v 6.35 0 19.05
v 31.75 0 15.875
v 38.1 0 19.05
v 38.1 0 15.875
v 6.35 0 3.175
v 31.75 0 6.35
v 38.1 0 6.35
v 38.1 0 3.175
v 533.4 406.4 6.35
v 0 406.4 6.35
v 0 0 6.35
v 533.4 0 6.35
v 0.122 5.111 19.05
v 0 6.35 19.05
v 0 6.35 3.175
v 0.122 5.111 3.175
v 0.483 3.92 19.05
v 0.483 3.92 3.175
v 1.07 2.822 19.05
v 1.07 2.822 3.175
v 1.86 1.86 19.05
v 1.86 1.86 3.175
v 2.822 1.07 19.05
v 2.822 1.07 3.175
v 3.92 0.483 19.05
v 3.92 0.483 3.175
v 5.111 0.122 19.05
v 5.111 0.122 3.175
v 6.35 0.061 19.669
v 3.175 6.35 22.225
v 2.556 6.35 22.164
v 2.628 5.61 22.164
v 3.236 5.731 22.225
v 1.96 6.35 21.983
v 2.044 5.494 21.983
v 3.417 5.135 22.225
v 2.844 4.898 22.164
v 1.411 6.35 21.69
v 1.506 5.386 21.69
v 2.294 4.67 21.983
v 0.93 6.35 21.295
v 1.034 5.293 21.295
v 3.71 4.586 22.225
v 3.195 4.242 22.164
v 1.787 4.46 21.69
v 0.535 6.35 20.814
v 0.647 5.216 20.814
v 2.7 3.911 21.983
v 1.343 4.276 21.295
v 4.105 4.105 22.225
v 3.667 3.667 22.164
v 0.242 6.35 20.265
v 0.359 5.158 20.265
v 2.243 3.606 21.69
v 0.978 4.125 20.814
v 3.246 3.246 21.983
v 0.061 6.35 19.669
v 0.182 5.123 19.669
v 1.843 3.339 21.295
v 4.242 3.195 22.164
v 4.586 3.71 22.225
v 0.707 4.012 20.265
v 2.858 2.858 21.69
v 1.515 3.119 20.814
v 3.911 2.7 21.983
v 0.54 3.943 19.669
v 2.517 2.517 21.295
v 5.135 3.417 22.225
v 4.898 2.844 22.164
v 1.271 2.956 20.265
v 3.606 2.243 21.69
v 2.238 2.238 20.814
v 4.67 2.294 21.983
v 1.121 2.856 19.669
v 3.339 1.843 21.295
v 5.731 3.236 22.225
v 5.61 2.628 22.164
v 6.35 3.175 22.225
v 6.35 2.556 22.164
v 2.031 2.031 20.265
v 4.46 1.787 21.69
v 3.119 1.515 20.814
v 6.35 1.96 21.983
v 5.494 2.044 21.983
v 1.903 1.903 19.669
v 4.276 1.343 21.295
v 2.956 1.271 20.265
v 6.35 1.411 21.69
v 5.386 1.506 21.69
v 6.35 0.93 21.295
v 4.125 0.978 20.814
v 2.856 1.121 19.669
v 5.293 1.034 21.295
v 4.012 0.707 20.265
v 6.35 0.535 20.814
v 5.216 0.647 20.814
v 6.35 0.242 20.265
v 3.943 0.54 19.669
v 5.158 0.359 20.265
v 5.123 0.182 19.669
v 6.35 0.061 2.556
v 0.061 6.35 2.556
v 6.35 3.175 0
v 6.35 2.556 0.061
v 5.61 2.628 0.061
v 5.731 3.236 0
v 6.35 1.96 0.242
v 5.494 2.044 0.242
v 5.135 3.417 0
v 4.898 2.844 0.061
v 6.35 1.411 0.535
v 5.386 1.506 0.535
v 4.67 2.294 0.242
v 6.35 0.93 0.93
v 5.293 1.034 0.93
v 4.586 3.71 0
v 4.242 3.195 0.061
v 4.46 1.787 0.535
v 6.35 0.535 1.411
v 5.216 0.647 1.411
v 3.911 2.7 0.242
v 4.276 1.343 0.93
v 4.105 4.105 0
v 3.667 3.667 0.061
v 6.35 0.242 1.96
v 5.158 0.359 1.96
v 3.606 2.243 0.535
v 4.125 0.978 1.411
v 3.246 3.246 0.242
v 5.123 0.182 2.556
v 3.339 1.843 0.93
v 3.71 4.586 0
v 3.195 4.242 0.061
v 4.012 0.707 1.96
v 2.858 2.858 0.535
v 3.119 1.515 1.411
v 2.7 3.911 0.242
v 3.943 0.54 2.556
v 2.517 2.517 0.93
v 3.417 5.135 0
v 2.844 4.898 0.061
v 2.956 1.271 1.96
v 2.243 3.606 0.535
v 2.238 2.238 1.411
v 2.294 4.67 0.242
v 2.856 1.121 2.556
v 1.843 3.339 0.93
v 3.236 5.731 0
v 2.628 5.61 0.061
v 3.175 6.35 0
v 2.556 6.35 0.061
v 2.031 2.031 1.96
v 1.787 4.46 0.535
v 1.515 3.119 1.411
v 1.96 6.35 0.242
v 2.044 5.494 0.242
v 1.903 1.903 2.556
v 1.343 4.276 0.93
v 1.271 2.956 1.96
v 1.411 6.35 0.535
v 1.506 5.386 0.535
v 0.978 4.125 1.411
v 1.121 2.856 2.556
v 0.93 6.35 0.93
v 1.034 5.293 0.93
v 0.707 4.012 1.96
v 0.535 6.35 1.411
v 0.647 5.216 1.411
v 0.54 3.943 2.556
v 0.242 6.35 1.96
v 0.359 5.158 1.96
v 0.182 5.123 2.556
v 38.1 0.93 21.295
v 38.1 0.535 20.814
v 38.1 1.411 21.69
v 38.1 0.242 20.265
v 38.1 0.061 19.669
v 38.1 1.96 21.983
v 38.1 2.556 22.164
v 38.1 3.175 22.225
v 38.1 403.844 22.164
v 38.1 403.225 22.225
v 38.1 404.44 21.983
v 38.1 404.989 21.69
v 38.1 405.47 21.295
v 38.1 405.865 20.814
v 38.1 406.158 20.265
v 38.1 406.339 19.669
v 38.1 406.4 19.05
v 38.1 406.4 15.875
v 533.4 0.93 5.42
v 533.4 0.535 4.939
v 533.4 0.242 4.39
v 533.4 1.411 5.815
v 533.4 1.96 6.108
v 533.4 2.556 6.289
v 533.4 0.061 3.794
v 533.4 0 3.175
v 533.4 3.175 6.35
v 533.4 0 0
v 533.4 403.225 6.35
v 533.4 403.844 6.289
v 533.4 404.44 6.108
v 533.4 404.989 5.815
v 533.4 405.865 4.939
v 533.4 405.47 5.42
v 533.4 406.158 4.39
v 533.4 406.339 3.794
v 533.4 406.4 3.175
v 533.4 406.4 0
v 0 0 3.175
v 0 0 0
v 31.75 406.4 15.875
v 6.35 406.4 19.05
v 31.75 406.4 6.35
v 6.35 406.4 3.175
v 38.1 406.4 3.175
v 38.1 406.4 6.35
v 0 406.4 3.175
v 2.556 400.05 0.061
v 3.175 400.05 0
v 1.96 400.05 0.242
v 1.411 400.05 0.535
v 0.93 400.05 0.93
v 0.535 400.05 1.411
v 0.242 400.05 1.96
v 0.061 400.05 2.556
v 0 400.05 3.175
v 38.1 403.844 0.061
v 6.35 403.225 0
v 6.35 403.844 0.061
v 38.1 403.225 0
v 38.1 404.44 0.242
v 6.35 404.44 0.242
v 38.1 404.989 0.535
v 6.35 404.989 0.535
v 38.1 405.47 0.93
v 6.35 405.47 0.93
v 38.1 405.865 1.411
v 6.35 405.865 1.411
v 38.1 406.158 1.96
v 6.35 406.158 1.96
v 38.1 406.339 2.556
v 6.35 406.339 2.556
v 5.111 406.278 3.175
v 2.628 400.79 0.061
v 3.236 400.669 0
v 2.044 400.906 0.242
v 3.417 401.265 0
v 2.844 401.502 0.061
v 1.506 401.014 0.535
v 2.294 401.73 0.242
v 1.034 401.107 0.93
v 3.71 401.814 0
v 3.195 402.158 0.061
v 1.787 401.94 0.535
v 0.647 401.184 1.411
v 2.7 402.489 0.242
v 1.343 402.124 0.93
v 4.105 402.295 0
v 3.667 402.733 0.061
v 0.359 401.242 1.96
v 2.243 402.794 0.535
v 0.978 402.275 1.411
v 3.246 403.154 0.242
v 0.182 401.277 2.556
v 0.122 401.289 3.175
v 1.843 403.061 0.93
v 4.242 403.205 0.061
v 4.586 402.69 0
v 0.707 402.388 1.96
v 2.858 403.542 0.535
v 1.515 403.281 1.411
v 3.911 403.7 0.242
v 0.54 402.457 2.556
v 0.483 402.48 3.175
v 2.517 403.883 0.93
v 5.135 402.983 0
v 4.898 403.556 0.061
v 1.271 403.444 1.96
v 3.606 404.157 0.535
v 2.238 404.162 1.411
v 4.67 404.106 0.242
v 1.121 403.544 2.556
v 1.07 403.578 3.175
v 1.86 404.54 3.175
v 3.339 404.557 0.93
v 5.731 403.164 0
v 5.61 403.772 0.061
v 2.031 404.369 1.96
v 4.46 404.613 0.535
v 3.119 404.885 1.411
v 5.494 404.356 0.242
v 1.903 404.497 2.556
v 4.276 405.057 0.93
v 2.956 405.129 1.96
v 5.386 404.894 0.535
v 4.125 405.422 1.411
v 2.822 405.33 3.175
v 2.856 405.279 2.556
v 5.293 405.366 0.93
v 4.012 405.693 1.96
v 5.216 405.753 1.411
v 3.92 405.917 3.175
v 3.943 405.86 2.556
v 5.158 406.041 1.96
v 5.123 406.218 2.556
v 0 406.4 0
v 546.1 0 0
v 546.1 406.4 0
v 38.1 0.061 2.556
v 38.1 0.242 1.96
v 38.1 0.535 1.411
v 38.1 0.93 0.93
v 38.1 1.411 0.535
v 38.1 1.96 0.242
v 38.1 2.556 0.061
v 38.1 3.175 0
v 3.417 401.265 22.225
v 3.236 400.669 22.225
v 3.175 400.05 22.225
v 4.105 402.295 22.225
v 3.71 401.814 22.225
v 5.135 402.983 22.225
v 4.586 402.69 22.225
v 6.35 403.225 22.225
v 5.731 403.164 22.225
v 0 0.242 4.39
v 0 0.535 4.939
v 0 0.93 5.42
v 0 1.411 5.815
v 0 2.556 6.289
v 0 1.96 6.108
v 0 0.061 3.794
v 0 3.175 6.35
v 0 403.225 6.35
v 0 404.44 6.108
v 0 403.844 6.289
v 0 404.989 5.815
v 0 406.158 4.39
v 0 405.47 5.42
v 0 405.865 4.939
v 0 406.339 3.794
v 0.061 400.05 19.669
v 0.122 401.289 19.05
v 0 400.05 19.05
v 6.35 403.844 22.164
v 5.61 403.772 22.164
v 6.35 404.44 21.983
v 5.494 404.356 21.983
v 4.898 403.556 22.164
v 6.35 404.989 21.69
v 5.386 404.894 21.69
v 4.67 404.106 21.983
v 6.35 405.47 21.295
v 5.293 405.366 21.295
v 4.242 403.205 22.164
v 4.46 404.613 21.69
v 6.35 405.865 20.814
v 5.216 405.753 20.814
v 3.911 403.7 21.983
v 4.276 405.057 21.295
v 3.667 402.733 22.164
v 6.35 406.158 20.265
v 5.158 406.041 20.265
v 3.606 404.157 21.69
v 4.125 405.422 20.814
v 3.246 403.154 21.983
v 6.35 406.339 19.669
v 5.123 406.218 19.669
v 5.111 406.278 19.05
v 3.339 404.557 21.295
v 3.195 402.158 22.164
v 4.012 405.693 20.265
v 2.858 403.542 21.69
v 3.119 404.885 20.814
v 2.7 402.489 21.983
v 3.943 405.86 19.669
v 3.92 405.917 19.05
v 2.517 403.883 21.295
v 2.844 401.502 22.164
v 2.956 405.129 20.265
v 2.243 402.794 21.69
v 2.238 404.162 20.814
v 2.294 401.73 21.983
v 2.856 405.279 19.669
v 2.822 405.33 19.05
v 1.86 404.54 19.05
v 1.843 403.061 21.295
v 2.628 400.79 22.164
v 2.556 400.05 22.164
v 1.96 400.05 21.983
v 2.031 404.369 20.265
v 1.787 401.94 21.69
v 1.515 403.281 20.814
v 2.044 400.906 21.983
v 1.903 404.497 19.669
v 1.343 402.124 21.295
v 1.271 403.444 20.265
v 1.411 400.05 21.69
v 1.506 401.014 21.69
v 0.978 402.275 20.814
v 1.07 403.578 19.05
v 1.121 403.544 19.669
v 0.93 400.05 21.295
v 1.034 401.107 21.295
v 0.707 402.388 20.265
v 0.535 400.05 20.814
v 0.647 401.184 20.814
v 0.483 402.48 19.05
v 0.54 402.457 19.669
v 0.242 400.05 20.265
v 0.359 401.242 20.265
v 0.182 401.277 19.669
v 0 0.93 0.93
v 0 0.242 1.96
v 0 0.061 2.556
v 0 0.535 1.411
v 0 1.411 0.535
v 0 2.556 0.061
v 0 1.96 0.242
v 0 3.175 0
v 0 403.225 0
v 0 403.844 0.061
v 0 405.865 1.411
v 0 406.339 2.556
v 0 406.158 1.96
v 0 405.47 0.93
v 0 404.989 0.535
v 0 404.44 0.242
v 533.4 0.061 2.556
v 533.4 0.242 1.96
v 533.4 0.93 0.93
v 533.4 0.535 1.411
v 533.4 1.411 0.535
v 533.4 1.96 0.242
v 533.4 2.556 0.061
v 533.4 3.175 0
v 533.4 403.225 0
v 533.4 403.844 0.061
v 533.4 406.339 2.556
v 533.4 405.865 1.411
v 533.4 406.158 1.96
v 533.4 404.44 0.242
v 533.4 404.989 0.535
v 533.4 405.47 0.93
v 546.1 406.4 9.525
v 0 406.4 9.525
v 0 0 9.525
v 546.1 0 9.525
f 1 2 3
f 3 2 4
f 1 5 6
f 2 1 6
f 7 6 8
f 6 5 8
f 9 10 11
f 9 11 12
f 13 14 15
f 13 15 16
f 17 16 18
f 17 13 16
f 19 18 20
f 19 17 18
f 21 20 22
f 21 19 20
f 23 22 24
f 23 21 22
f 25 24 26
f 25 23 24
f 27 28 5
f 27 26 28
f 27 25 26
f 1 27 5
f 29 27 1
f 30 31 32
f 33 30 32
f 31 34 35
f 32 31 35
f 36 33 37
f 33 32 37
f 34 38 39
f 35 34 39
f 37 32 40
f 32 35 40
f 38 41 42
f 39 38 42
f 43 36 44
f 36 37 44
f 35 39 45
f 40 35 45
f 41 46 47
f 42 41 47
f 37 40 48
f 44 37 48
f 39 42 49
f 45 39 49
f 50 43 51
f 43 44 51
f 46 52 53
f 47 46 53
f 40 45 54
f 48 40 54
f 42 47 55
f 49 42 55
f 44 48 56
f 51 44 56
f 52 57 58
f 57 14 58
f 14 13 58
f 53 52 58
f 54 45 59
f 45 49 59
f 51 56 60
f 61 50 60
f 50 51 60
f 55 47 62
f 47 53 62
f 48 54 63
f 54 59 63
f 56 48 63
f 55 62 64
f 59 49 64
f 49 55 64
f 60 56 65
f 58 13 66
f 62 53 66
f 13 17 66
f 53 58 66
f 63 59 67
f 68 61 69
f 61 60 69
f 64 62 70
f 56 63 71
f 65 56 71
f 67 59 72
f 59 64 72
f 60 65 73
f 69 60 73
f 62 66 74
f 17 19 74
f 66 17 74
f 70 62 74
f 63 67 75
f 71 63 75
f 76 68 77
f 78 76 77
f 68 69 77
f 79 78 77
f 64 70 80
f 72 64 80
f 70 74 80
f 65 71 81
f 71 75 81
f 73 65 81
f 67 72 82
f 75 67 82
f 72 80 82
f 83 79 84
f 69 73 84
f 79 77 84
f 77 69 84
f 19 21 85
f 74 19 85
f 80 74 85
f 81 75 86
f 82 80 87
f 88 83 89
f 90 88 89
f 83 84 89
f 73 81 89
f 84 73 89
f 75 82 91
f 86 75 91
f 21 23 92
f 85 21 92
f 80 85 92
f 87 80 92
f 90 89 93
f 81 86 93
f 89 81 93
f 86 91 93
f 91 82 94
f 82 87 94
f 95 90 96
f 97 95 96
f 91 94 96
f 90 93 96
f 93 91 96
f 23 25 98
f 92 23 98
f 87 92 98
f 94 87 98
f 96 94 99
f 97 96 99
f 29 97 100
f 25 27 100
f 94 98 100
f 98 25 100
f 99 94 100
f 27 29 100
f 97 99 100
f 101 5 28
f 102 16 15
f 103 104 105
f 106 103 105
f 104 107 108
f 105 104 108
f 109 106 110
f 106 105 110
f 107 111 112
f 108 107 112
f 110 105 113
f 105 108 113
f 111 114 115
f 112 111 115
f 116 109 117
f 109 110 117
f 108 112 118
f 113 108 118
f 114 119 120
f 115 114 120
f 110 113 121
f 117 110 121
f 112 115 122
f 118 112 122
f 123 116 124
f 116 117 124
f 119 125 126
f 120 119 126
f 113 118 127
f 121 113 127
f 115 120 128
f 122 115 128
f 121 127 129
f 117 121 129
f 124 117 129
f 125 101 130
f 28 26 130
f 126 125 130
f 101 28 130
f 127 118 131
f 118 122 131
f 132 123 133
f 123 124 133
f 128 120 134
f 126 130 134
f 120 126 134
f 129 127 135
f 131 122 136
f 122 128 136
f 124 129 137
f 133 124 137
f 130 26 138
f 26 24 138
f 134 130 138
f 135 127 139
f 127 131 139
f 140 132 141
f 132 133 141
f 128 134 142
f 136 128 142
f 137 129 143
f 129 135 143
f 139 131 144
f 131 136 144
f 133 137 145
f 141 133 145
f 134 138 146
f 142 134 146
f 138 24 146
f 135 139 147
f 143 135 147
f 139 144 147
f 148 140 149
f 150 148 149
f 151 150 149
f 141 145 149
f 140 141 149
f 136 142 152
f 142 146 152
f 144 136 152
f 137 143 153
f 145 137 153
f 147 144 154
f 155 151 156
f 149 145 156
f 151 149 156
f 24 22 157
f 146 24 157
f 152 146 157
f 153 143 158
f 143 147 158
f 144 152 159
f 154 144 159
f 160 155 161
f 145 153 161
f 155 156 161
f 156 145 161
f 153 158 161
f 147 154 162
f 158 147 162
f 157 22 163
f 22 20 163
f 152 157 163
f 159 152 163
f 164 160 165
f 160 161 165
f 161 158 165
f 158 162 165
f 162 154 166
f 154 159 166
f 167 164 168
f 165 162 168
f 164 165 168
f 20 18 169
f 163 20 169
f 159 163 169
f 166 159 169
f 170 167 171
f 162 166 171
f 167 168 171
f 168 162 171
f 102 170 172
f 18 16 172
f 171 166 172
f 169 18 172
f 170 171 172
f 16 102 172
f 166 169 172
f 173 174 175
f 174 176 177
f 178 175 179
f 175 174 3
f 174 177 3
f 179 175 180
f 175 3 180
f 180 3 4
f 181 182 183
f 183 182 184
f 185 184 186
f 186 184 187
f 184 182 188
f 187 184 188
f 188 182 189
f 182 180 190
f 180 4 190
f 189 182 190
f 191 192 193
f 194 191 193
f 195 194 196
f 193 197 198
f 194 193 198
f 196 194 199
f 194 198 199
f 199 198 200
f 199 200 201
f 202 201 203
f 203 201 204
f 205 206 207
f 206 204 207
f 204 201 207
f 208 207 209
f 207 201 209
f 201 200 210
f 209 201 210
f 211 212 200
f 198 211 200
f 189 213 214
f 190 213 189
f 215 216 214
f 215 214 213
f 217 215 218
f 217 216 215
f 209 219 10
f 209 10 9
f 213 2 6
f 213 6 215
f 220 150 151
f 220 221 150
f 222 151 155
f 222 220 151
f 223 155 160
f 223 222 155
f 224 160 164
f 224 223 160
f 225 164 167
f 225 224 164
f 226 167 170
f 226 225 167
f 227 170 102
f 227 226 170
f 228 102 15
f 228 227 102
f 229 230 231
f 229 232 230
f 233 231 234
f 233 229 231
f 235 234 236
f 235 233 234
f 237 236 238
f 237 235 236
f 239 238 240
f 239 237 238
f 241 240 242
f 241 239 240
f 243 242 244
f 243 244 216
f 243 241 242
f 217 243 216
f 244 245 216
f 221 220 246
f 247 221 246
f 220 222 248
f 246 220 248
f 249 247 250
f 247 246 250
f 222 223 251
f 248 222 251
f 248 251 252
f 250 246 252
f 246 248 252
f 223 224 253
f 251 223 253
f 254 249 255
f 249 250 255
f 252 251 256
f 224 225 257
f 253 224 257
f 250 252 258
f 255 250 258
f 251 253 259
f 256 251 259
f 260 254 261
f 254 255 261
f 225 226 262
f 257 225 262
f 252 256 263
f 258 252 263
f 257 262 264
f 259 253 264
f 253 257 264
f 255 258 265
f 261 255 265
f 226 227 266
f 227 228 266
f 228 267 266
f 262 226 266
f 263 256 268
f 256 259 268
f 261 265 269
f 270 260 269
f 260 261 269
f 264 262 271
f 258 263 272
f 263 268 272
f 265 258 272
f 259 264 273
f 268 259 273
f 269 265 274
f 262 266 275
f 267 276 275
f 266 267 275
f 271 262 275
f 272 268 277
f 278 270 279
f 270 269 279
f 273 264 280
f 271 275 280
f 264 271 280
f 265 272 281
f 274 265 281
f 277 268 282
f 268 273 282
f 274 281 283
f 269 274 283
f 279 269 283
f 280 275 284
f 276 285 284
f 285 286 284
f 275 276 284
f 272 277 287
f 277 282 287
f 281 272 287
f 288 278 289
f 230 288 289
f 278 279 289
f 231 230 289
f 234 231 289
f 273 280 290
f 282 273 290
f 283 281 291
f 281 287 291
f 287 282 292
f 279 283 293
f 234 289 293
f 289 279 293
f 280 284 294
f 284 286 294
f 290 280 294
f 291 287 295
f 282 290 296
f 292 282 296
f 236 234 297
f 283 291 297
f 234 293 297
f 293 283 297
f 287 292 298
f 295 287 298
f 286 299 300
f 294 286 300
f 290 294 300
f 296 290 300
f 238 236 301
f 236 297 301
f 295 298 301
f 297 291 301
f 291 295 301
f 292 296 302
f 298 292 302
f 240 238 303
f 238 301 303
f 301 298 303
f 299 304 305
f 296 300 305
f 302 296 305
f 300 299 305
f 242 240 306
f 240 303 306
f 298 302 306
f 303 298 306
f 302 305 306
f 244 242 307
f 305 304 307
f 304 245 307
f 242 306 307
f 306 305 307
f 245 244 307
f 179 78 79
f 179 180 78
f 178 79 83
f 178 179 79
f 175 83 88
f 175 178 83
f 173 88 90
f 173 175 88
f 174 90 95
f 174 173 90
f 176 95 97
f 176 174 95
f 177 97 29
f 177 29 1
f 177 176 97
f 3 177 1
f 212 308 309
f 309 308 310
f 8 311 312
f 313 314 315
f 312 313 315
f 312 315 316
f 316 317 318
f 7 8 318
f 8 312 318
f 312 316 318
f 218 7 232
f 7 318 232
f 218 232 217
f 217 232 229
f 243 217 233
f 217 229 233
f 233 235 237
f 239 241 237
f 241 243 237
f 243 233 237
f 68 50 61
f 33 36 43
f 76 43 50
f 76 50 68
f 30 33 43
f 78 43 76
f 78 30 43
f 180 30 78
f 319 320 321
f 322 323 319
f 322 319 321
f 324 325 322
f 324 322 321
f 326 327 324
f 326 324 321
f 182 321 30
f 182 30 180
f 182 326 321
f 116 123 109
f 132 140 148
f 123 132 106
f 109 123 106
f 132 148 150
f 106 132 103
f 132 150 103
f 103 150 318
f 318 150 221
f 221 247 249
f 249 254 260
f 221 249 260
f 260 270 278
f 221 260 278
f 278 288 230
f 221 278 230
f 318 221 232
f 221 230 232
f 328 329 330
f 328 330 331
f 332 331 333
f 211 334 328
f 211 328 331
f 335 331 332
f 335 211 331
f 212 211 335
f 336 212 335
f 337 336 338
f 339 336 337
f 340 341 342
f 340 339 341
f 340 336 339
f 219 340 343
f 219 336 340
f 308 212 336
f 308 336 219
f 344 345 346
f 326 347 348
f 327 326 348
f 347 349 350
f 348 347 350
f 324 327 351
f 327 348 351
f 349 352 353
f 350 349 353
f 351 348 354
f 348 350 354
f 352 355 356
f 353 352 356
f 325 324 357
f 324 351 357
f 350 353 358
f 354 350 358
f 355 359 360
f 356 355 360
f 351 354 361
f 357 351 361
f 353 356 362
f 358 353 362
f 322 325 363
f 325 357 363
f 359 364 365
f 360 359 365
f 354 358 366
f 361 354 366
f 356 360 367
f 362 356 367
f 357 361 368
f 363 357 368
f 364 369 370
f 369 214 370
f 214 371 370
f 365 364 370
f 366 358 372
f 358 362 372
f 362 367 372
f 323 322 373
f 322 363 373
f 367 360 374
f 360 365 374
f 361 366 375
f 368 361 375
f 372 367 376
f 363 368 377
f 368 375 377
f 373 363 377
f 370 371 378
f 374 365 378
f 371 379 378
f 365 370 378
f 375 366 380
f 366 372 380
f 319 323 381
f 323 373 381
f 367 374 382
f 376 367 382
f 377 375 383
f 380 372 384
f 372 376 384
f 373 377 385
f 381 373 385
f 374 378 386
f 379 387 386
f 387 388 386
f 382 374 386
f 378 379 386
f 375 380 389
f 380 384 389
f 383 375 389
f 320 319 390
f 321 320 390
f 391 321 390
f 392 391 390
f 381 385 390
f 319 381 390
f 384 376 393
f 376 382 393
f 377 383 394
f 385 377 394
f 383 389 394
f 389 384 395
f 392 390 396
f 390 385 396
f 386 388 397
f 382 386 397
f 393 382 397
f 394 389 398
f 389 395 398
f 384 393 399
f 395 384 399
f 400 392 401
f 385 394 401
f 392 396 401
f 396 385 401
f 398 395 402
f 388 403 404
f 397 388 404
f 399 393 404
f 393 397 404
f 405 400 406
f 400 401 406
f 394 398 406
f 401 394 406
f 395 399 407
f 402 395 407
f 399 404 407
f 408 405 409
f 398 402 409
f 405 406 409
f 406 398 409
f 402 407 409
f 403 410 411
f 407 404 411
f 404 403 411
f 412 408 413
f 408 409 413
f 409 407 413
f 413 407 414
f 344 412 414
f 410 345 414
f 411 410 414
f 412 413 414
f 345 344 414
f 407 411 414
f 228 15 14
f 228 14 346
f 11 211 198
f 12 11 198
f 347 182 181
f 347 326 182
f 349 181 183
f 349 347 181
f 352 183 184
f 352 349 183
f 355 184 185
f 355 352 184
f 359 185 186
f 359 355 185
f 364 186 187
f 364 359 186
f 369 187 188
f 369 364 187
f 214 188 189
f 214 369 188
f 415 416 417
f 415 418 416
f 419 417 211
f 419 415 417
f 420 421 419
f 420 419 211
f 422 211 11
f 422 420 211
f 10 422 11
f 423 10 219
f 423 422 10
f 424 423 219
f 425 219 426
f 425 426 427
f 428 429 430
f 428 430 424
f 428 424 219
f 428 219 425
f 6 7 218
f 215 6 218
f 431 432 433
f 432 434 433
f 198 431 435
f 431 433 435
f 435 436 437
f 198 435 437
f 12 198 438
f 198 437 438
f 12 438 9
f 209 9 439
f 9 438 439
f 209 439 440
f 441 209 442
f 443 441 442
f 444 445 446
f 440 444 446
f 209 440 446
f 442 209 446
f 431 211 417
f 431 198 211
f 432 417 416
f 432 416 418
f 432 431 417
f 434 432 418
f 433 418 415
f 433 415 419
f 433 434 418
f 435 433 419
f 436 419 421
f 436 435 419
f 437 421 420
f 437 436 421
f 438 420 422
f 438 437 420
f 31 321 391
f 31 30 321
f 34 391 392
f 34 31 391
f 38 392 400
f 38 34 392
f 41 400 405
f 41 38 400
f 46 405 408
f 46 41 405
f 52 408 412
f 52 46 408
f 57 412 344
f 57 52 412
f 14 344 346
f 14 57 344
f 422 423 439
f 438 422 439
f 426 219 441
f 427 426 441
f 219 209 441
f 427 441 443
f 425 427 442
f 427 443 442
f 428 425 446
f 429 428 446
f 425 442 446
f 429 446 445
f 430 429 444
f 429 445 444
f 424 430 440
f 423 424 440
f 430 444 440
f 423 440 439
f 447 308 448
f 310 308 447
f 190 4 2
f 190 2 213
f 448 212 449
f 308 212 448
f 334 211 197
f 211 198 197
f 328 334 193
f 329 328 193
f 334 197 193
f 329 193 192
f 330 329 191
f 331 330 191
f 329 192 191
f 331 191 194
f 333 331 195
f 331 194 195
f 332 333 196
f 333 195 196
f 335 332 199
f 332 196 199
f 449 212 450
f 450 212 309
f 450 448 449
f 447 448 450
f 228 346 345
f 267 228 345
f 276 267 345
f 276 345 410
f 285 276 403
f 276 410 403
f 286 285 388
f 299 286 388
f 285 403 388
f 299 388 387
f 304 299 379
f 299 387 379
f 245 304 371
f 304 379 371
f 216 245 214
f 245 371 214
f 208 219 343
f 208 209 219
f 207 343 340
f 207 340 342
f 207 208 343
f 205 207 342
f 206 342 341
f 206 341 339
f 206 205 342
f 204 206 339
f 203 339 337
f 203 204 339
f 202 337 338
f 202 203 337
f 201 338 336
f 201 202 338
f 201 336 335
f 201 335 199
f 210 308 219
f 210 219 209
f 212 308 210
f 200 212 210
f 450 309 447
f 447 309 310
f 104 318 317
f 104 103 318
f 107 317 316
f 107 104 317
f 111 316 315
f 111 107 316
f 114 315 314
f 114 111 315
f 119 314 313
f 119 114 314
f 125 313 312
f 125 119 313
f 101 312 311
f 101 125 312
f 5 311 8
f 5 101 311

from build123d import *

# Parameters (mm, degrees)
F0_W      = 546.1
F0_H      = 406.4
F1_DEPTH  = 9.525
F2_W      = 533.4
F2_H      = 406.4
F3_DEPTH  = 6.35
F4_R      = 3.175
F5_W      = 533.4
F5_H      = 406.4
F6_DEPTH  = 6.35
F7_R      = 3.175
F8_W      = 38.1
F8_H      = 406.4
F9_DEPTH  = 22.225
F10_W     = 406.4
F10_H     = 9.525
F11_DEPTH = 6.35
F12_R     = 6.35
F13_R     = 3.175
F14_R     = 3.175


with BuildPart() as f1:
    # F0 (on Top) → F1 (new body)
    with BuildSketch(Plane.XY):
        with Locations((273.05, 203.2)):
            Rectangle(F0_W, F0_H)
    extrude(amount=F1_DEPTH)


with BuildPart() as f3:
    # F2 (on Top) → F3 (new body)
    with BuildSketch(Plane.XY):
        with Locations((266.7, 203.2)):
            Rectangle(F2_W, F2_H)
    extrude(amount=F3_DEPTH)

    # F4
    f4_edges = [f3.edges().sort_by_distance(p)[0] for p in [
        (266.7, 0, 6.35),
        (266.7, 406.4, 6.35),
    ]]
    fillet(f4_edges, radius=F4_R)


with BuildPart() as f6:
    # F5 (on Top) → F6 (new body)
    with BuildSketch(Plane.XY):
        with Locations((266.7, 203.2)):
            Rectangle(F5_W, F5_H)
    extrude(amount=F6_DEPTH)

    # F7
    f7_edges = [f6.edges().sort_by_distance(p)[0] for p in [
        (266.7, 0, 0),
        (266.7, 406.4, 0),
    ]]
    fillet(f7_edges, radius=F7_R)


with BuildPart() as f9:
    # F8 (on Top) → F9 (new body)
    with BuildSketch(Plane.XY):
        with Locations((19.05, 203.2)):
            Rectangle(F8_W, F8_H)
    extrude(amount=F9_DEPTH)

    # F10 (on face) → F11 (cut)
    with BuildSketch(Plane.YZ.offset(38.1)):
        with Locations((203.2, 11.1125)):
            Rectangle(F10_W, F10_H)
    extrude(amount=-F11_DEPTH, mode=Mode.SUBTRACT)

    # F12
    f12_edges = [f9.edges().sort_by_distance(p)[0] for p in [
        (0, 0, 11.1125),
        (0, 406.4, 11.1125),
    ]]
    fillet(f12_edges, radius=F12_R)

    # F13
    f13_edges = [f9.edges().sort_by_distance(p)[0] for p in [
        (22.225, 406.4, 0),
        (1.859872, 404.540128, 0),
        (0, 203.2, 0),
        (1.859872, 1.859872, 0),
        (22.225, 0, 0),
    ]]
    fillet(f13_edges, radius=F13_R)

    # F14
    f14_edges = [f9.edges().sort_by_distance(p)[0] for p in [
        (22.225, 0, 22.225),
        (1.859872, 1.859872, 22.225),
        (0, 203.2, 22.225),
        (1.859872, 404.540128, 22.225),
        (22.225, 406.4, 22.225),
    ]]
    fillet(f14_edges, radius=F14_R)


solid = Compound([f1.part, f3.part, f6.part, f9.part])
